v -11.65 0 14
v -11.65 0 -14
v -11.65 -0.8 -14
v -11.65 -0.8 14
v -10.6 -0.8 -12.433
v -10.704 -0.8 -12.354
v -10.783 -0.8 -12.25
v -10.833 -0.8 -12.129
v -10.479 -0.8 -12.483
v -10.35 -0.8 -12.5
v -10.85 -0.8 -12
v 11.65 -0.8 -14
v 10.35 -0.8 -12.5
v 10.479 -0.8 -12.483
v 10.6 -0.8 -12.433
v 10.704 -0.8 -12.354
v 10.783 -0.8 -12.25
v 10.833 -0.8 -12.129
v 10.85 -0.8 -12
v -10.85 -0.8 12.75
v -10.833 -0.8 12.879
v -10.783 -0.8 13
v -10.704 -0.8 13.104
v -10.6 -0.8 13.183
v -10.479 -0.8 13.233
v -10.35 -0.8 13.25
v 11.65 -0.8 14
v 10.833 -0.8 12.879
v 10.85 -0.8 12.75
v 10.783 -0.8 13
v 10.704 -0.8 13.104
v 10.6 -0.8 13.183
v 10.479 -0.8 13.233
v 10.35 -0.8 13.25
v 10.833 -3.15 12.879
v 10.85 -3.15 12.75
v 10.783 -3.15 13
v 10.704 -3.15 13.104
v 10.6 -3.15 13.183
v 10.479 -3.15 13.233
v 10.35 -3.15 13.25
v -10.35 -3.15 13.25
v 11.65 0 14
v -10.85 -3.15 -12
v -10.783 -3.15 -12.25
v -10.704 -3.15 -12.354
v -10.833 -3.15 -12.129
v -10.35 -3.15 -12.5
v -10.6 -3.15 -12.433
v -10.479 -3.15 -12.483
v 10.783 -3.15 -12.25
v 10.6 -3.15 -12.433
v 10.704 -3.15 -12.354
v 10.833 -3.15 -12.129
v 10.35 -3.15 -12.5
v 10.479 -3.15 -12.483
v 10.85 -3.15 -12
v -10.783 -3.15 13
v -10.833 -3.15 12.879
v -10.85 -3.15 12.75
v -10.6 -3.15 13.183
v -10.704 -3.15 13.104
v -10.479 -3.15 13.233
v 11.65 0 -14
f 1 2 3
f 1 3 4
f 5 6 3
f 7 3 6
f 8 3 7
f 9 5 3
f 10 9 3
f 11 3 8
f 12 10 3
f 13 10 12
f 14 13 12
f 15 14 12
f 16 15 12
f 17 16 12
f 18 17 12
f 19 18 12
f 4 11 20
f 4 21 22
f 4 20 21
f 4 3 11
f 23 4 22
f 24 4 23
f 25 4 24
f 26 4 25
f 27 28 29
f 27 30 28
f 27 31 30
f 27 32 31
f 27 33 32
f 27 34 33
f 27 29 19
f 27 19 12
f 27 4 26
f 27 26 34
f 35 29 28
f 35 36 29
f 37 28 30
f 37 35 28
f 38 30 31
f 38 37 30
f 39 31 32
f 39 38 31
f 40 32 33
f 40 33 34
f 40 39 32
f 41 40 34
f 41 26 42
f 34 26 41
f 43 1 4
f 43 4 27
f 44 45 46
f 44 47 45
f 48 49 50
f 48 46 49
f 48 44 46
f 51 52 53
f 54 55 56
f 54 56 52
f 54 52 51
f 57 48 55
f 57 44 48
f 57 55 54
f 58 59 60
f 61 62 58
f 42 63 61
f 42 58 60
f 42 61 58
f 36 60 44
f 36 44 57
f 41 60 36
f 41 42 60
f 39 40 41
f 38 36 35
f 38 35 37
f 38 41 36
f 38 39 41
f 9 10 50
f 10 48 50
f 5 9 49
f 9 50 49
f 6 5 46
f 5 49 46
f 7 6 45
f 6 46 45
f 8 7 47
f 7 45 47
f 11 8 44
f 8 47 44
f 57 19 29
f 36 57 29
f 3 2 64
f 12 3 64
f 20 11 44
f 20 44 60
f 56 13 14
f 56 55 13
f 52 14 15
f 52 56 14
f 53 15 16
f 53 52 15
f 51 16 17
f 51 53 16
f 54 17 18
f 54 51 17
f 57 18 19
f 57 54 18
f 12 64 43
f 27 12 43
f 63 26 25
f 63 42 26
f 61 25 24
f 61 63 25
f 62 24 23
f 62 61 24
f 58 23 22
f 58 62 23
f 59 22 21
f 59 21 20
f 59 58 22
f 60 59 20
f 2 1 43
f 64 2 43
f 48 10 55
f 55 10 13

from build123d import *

# Parameters (mm, degrees)
F0_W     = 23.3
F0_H     = 28
F1_DEPTH = 0.8
F2_W     = 21.7
F2_H     = 25.75
F3_DEPTH = 2.35
F4_R     = 0.5


with BuildPart() as f1:
    # F0 (on Front) → F1 (new body)
    with BuildSketch(Plane.XZ):
        Rectangle(F0_W, F0_H)
    extrude(amount=F1_DEPTH)

    # F2 (on face) → F3 (join)
    with BuildSketch(Plane.XZ.offset(0.8)):
        with Locations((0, 0.375)):
            Rectangle(F2_W, F2_H)
    extrude(amount=F3_DEPTH)

    # F4
    f4_edges = [f1.edges().sort_by_distance(p)[0] for p in [
        (-10.85, -1.975, -12.5),
        (10.85, -1.975, -12.5),
        (10.85, -1.975, 13.25),
        (-10.85, -1.975, 13.25),
    ]]
    fillet(f4_edges, radius=F4_R)


solid = f1.part
